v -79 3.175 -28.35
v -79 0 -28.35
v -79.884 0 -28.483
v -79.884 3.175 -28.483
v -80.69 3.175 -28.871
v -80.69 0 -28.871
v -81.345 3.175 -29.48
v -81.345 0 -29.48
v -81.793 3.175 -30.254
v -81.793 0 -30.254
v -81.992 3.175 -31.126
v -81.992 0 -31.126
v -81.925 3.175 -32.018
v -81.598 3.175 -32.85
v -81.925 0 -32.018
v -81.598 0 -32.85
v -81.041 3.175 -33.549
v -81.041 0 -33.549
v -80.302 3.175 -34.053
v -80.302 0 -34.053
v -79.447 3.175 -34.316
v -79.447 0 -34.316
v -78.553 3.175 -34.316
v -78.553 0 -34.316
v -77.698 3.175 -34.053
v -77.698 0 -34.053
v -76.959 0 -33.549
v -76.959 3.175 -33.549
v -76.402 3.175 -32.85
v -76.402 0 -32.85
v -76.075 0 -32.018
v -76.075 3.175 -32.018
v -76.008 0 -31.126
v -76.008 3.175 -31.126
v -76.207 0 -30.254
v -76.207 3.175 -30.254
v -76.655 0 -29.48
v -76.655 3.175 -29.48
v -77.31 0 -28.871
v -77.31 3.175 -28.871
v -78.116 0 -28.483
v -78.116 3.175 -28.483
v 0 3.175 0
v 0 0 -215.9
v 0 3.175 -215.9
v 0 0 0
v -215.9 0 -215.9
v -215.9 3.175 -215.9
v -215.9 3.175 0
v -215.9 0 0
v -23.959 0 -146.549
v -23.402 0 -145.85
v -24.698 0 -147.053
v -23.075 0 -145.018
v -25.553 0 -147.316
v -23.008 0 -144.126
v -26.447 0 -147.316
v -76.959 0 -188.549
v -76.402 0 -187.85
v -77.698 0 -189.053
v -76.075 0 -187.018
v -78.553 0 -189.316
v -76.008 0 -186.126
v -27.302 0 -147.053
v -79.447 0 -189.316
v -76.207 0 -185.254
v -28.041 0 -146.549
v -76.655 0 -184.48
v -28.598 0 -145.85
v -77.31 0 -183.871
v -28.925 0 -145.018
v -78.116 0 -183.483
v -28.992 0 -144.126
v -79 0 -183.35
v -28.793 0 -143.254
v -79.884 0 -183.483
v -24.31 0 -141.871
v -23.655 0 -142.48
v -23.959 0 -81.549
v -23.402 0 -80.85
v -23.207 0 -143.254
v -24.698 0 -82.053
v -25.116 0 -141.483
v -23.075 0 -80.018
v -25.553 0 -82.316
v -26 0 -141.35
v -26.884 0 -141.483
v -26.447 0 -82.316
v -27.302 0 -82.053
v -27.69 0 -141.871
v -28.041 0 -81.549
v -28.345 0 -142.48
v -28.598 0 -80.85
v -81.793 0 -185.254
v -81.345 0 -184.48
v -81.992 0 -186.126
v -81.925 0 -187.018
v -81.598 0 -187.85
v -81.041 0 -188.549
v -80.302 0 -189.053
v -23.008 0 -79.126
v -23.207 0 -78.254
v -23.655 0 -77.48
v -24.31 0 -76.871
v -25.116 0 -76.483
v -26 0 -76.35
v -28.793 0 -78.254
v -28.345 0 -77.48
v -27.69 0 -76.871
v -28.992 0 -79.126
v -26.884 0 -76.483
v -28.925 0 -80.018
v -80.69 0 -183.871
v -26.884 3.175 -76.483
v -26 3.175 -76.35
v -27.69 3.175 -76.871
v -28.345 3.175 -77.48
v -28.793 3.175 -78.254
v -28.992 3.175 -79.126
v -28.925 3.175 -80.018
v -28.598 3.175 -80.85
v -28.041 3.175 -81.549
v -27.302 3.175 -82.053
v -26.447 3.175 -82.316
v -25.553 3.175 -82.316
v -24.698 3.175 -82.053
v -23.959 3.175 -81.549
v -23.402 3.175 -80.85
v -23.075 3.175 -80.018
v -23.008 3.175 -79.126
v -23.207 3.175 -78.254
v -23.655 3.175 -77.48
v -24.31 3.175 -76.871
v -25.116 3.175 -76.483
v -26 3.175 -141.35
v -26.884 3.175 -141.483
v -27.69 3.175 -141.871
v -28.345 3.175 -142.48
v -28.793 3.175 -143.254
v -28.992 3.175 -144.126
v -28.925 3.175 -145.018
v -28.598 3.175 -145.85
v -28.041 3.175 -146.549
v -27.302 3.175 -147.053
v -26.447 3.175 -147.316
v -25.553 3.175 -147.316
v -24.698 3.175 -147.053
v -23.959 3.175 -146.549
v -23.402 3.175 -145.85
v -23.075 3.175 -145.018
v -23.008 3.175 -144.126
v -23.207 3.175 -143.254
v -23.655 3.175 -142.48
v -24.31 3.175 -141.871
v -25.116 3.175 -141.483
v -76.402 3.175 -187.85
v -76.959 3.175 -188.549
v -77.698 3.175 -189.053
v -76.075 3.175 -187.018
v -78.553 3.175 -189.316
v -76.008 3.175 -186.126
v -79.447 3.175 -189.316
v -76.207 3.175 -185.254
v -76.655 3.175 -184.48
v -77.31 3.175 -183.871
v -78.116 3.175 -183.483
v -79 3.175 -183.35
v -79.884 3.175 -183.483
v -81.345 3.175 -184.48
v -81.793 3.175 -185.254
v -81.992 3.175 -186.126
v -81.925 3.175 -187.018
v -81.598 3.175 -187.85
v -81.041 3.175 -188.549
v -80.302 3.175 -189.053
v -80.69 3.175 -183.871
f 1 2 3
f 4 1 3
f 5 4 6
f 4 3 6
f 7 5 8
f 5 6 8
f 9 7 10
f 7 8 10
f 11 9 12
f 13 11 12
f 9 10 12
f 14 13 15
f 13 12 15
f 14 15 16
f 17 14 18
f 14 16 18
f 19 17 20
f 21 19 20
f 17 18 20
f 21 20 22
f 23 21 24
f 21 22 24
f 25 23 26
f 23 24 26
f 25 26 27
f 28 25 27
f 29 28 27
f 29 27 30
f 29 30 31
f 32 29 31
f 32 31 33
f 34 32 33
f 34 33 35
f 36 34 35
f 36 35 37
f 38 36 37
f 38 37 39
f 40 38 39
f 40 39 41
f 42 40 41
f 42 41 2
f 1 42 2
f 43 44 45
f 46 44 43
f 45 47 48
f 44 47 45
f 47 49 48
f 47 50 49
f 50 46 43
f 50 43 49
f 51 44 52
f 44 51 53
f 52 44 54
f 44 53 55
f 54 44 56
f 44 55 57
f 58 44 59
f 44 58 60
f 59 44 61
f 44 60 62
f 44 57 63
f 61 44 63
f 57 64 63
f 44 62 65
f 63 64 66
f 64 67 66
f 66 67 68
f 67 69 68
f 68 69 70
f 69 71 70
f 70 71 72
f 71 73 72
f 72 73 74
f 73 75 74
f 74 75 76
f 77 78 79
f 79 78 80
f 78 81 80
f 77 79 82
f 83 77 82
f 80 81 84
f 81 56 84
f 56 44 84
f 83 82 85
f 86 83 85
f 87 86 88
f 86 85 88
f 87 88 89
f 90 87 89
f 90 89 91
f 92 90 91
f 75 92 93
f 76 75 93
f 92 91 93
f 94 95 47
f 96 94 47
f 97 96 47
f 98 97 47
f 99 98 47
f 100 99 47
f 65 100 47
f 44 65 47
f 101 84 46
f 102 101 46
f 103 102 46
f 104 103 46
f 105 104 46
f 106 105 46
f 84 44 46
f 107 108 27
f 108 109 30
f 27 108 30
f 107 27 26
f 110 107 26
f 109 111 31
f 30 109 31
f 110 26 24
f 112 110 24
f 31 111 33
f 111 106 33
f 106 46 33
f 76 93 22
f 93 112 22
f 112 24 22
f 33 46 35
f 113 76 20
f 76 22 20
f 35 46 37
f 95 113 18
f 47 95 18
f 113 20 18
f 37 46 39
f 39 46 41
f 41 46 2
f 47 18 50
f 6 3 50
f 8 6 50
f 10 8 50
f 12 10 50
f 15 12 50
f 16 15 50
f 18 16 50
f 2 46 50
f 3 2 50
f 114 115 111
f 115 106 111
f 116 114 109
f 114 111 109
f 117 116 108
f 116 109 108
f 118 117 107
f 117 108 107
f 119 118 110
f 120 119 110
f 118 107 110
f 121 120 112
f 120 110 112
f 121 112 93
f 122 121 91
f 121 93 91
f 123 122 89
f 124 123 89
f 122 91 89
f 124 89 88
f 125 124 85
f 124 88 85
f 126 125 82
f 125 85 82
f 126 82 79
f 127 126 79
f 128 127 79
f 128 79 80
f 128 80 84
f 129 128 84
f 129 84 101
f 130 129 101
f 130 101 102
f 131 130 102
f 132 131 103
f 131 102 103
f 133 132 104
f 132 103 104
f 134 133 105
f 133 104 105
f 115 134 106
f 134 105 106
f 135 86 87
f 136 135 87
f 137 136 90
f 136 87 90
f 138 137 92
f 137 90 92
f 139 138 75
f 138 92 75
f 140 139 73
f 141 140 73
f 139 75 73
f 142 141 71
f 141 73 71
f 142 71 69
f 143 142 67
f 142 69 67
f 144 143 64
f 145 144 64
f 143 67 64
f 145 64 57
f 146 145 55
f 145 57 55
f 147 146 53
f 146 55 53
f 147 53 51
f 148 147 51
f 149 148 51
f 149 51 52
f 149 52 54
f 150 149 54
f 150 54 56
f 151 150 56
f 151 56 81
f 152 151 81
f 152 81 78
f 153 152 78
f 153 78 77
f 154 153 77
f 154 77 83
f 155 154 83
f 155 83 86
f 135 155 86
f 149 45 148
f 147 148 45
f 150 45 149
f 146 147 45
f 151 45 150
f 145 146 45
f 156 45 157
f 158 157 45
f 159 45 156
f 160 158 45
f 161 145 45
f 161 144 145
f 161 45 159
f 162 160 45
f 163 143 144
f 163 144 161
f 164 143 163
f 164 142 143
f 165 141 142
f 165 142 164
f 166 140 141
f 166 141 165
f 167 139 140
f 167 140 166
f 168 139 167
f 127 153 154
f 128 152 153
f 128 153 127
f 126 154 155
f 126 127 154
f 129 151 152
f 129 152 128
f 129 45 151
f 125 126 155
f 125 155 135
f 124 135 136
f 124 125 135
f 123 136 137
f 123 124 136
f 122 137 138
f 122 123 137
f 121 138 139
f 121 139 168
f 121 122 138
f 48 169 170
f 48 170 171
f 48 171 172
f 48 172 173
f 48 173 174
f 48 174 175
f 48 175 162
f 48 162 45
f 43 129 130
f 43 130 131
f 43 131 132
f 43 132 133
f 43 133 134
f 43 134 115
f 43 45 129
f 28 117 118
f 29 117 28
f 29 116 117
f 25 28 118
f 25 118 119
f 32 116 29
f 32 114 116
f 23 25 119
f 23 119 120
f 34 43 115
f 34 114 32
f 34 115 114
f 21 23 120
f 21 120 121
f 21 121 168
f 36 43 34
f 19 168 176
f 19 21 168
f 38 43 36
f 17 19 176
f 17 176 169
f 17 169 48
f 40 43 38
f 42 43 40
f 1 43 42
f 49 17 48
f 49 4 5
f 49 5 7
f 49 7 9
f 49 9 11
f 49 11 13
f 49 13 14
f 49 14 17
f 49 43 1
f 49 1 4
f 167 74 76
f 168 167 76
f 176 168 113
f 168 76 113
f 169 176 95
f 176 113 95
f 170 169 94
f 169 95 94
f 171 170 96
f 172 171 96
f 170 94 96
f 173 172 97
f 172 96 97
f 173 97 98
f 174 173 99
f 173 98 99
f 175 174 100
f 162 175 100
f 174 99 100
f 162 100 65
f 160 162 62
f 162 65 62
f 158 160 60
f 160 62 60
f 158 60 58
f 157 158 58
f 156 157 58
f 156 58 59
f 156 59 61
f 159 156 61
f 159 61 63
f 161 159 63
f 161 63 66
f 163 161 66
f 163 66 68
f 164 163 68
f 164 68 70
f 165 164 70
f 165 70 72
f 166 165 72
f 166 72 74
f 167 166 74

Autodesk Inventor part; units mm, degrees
ref_plane "YZ Plane" through (0, 0, 0) normal (1, 0, 0) x (0, 1, 0)
ref_plane "XZ Plane" through (0, 0, 0) normal (0, 1, 0) x (-1, 0, 0)
ref_plane "XY Plane" through (0, 0, 0) normal (0, 0, 1) x (1, 0, 0)
sketch "Sketch1" plane through (0, 0, 0) normal (0, 1, 0) x (-1, 0, 0)
  line L0 (0, 0) -> (215.9, 0)
  line L1 (215.9, 0) -> (215.9, -215.9)
  line L2 (215.9, -215.9) -> (0, -215.9)
  line L3 (0, -215.9) -> (0, 0)
  dimension "d0" = 215.9
  dimension "d1" = 215.9
extrude "Extrusion1" add sketch "Sketch1" along normal blind 3.175
sketch "Sketch2" plane through (0, 3.175, 0) normal (0, 1, 0) x (1, 0, 0)
  line L0 (-291.9068, 6.35) -> (0, 6.35)
  line L1 (0, 6.35) -> (0, 293.5185)
  line L2 (0, 293.5185) -> (-291.9068, 293.5185)
  line L3 (-291.9068, 293.5185) -> (-291.9068, 6.35)
  line L4 (-215.9, 0) -> (0, 0) projected
  line L5 (0, 0) -> (0, 215.9) projected
  point P0 (-26, 79.35)
  point P1 (-79, 31.35)
  point P2 (-79, 186.35)
  point P3 (-26, 144.35)
  dimension "d4" = 138
  dimension "d5" = 26
  dimension "d6" = 79
  dimension "d7" = 25
  dimension "d8" = 79
  dimension "d9" = 26
  dimension "d10" = 73
  dimension "d11" = 180
  dimension "d12" = 6.35
  dimension "d13" = 0
hole "Hole1" at (-26, 3.175, -79.35) at (-79, 3.175, -31.35) at (-79, 3.175, -186.35) at (-26, 3.175, -144.35) direction (0, -1, 0) diameter 6 end through all
properties part number "side panel v1.2"
